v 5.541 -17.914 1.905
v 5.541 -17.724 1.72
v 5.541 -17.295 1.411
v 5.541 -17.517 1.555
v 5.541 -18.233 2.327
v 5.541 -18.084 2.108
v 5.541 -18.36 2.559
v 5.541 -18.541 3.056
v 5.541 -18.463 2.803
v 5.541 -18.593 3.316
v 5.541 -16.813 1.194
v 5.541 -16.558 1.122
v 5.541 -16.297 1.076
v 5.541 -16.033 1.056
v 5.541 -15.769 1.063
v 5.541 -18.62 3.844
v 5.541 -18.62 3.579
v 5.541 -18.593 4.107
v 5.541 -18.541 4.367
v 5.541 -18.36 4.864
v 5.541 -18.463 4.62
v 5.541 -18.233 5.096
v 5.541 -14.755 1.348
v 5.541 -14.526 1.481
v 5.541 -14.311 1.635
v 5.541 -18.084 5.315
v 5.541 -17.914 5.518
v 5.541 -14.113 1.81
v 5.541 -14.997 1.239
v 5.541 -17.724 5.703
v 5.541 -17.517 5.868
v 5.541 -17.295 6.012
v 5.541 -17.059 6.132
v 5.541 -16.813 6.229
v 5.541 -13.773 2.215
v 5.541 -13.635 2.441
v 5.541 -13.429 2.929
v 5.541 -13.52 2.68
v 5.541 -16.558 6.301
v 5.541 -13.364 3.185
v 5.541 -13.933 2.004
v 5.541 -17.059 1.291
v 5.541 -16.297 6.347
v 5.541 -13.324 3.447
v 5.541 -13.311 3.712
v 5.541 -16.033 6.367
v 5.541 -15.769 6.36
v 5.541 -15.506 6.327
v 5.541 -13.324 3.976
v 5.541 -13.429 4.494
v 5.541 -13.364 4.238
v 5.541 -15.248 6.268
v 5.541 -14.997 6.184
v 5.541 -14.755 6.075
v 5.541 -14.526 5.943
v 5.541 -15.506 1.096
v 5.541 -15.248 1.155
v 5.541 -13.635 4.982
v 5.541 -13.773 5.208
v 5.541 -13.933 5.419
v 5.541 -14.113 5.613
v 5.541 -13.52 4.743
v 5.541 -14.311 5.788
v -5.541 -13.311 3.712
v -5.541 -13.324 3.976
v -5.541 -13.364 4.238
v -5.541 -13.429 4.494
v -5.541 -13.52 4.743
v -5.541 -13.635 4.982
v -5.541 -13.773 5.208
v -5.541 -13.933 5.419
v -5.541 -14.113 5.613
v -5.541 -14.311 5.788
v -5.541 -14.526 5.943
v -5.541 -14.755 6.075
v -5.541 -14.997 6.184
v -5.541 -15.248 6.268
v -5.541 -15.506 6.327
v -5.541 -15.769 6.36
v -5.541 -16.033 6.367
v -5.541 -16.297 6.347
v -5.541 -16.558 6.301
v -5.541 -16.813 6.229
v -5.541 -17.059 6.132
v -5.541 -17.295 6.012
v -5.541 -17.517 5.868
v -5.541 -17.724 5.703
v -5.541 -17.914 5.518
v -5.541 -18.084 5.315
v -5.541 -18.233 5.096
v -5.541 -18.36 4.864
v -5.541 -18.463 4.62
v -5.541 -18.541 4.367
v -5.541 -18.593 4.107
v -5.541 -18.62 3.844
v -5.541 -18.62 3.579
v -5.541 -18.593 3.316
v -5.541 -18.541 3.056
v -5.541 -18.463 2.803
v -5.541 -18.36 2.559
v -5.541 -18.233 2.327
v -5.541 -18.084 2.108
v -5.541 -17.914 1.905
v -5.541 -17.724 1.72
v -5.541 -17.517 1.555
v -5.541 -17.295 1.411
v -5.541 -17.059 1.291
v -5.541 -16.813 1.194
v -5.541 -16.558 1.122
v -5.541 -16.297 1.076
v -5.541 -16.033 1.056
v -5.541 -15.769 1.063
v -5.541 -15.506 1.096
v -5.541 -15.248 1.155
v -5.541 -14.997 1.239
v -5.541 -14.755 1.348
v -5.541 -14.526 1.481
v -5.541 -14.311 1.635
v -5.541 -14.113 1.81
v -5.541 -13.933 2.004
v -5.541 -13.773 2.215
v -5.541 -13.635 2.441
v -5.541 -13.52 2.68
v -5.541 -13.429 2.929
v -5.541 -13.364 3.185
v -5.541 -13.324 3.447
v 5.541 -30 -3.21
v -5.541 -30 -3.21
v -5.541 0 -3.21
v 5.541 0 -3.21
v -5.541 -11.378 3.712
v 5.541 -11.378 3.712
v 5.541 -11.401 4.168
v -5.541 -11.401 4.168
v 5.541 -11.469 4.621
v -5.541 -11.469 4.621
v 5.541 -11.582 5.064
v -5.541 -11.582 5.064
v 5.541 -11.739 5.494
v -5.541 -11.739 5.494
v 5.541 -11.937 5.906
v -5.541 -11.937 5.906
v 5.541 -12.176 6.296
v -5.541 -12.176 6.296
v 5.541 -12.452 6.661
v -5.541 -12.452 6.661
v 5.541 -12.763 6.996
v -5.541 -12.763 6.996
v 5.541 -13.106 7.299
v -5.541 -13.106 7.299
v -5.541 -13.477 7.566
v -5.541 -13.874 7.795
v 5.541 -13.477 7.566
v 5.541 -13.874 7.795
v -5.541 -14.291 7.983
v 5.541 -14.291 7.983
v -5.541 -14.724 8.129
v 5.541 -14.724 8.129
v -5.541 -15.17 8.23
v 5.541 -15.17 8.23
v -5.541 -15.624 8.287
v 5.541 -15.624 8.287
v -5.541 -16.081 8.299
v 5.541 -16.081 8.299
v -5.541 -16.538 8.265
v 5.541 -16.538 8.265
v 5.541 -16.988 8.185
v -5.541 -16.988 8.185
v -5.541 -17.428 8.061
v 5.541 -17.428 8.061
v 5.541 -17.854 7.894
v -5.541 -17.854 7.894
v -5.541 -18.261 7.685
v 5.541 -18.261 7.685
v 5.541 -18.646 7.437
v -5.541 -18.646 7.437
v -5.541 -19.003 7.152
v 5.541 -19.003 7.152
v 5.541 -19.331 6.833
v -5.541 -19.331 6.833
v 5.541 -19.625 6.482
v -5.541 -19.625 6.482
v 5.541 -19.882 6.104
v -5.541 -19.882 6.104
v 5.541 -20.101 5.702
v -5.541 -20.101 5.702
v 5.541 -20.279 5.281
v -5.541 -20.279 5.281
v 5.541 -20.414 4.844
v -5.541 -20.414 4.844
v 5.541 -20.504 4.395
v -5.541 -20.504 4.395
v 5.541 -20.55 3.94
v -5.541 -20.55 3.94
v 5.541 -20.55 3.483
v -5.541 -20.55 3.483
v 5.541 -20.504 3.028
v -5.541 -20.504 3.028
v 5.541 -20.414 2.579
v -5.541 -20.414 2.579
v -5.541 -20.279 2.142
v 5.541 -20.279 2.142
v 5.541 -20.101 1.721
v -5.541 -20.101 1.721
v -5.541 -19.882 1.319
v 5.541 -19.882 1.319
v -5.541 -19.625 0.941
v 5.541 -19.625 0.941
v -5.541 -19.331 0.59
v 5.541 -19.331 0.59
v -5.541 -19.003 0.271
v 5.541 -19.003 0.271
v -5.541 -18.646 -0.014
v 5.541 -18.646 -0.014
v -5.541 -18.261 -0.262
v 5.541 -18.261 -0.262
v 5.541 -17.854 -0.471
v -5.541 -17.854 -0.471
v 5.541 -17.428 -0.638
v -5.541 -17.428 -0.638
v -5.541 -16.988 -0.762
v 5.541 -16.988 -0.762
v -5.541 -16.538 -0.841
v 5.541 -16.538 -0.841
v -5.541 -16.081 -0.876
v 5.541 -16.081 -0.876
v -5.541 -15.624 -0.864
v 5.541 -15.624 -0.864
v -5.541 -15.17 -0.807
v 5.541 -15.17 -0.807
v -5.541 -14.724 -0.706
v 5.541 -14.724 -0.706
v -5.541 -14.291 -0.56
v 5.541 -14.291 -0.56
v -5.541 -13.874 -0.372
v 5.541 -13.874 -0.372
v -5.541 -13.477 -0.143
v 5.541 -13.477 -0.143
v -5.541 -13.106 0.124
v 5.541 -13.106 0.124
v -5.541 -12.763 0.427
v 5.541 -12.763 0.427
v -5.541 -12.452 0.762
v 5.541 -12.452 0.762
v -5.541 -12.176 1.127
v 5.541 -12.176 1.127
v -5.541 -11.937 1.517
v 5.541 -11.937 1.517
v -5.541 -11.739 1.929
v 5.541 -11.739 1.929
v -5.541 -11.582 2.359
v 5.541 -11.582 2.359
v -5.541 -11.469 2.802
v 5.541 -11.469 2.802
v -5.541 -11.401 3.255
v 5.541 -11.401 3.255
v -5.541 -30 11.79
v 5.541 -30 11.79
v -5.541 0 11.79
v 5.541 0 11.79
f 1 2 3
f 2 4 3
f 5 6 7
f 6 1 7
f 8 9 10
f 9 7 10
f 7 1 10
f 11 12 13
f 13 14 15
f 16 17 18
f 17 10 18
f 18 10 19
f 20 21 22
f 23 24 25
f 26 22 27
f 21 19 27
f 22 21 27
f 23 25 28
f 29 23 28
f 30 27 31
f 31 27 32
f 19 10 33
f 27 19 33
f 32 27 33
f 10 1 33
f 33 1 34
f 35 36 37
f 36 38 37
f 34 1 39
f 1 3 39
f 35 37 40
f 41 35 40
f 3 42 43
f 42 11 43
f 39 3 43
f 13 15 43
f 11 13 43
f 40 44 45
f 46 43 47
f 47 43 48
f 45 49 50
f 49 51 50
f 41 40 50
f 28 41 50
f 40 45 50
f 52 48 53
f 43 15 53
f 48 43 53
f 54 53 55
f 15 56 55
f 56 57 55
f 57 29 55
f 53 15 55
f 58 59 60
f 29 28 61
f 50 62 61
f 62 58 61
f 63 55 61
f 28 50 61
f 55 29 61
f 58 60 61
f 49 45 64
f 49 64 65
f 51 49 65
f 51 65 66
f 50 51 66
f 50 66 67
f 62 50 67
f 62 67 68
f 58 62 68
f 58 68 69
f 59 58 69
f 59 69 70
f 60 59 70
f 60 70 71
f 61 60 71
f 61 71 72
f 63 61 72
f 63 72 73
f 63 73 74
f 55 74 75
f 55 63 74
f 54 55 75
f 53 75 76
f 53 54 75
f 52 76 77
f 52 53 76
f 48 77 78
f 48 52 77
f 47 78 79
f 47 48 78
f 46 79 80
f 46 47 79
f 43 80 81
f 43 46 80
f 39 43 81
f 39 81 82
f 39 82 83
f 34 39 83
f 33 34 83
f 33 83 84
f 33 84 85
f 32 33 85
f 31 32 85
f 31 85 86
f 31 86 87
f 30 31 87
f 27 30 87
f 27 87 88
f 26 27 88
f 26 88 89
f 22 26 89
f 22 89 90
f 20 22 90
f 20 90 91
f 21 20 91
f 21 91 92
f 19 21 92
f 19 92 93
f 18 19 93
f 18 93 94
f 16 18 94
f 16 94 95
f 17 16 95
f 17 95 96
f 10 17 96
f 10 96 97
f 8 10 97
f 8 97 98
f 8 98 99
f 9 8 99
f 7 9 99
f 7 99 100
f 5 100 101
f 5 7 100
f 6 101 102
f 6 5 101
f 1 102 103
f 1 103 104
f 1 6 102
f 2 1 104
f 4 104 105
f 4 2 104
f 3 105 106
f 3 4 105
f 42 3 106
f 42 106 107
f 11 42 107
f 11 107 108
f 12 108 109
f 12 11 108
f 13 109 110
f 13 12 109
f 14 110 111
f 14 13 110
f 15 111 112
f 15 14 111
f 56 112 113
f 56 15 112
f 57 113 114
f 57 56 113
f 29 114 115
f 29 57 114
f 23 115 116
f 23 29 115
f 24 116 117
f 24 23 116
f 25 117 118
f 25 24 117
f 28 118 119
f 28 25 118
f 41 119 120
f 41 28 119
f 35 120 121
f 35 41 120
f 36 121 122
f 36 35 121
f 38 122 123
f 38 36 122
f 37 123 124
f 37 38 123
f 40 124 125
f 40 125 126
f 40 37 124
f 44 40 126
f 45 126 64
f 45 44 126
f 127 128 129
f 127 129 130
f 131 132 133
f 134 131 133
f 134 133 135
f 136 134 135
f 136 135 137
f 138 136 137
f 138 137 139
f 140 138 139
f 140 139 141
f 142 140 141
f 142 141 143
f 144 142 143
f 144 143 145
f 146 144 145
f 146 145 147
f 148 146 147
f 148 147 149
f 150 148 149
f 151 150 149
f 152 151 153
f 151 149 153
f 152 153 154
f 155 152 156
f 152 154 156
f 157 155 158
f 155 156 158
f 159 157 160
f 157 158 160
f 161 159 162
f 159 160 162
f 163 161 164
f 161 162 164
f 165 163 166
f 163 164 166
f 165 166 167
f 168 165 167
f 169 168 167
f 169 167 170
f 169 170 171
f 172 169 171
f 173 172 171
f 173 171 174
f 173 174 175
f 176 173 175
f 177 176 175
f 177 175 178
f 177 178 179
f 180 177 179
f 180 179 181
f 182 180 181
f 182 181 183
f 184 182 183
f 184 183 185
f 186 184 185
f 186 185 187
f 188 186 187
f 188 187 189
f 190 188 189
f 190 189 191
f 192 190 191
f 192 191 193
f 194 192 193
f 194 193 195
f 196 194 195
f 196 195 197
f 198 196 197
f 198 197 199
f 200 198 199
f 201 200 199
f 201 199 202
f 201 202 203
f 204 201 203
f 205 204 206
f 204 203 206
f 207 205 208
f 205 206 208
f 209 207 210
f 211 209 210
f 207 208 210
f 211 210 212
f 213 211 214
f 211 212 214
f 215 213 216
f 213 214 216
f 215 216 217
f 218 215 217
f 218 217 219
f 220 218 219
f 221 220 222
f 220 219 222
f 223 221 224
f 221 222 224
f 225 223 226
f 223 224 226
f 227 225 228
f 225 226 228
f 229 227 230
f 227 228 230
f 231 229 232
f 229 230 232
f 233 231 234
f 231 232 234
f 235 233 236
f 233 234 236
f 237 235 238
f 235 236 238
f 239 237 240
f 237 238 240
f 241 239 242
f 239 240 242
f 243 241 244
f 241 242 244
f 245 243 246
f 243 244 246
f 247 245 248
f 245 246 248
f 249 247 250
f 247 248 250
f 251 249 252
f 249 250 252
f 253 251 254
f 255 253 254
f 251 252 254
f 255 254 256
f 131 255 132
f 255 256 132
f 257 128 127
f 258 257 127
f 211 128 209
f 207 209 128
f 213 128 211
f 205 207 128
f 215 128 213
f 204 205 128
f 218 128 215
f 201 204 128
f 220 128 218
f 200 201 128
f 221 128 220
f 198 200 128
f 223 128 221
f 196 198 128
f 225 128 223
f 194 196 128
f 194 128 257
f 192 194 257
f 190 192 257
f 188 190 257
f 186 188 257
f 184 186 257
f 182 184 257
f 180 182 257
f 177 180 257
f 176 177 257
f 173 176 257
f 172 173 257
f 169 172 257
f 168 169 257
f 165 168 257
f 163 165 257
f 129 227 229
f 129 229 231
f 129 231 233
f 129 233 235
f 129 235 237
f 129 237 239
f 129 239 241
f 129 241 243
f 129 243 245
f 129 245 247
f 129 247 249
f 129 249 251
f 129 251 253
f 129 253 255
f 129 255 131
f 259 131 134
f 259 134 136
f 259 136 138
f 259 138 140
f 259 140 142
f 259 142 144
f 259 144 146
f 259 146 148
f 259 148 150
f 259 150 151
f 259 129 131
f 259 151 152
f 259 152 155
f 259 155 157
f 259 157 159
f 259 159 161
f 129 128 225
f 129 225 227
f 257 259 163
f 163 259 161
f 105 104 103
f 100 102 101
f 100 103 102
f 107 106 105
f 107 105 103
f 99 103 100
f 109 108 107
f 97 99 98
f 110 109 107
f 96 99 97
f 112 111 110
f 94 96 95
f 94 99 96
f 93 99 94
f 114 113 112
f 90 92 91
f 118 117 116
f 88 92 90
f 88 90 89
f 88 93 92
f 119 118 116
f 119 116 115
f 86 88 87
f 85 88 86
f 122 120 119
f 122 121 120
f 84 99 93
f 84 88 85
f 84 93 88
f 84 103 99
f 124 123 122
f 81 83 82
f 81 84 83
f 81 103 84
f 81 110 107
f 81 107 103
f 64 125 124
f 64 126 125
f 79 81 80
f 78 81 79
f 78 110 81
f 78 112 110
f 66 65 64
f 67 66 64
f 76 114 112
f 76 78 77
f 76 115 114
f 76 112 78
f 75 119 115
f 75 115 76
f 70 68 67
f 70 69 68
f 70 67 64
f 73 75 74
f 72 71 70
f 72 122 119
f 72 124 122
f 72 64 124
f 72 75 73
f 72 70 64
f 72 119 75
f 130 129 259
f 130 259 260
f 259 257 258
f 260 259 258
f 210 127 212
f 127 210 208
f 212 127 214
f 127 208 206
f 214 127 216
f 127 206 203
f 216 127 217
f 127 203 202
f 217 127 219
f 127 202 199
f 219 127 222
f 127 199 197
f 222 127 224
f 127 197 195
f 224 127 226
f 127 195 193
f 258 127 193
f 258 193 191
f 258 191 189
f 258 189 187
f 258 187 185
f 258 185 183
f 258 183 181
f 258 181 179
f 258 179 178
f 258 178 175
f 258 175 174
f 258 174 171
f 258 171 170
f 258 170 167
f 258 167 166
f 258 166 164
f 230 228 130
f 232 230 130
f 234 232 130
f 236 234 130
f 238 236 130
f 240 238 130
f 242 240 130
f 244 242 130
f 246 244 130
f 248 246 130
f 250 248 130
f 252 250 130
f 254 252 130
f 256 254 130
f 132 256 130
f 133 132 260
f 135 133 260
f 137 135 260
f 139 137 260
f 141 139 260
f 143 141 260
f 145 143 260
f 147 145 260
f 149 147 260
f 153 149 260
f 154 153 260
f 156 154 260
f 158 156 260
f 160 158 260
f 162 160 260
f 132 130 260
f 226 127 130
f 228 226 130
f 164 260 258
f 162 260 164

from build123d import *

# Parameters (mm, degrees)
F0_W     = 11.082272
F0_H     = 15
F1_DEPTH = 30
F2_R     = 4.588634
F2_R_2   = 2.655878
F3_DEPTH = 11.083273


with BuildPart() as f1:
    # F0 (on Front) → F1 (new body)
    with BuildSketch(Plane.XZ):
        with Locations((0, 4.290295)):
            Rectangle(F0_W, F0_H)
    extrude(amount=F1_DEPTH)

    # F2 (on face) → F3 (cut, through all)
    with BuildSketch(Plane.YZ.offset(5.541136)):
        with Locations((-15.967023, 3.711534)):
            Circle(F2_R)
        with Locations((-15.967023, 3.711534)):
            Circle(F2_R_2, mode=Mode.SUBTRACT)
    extrude(amount=-F3_DEPTH, mode=Mode.SUBTRACT)


solid = f1.part
